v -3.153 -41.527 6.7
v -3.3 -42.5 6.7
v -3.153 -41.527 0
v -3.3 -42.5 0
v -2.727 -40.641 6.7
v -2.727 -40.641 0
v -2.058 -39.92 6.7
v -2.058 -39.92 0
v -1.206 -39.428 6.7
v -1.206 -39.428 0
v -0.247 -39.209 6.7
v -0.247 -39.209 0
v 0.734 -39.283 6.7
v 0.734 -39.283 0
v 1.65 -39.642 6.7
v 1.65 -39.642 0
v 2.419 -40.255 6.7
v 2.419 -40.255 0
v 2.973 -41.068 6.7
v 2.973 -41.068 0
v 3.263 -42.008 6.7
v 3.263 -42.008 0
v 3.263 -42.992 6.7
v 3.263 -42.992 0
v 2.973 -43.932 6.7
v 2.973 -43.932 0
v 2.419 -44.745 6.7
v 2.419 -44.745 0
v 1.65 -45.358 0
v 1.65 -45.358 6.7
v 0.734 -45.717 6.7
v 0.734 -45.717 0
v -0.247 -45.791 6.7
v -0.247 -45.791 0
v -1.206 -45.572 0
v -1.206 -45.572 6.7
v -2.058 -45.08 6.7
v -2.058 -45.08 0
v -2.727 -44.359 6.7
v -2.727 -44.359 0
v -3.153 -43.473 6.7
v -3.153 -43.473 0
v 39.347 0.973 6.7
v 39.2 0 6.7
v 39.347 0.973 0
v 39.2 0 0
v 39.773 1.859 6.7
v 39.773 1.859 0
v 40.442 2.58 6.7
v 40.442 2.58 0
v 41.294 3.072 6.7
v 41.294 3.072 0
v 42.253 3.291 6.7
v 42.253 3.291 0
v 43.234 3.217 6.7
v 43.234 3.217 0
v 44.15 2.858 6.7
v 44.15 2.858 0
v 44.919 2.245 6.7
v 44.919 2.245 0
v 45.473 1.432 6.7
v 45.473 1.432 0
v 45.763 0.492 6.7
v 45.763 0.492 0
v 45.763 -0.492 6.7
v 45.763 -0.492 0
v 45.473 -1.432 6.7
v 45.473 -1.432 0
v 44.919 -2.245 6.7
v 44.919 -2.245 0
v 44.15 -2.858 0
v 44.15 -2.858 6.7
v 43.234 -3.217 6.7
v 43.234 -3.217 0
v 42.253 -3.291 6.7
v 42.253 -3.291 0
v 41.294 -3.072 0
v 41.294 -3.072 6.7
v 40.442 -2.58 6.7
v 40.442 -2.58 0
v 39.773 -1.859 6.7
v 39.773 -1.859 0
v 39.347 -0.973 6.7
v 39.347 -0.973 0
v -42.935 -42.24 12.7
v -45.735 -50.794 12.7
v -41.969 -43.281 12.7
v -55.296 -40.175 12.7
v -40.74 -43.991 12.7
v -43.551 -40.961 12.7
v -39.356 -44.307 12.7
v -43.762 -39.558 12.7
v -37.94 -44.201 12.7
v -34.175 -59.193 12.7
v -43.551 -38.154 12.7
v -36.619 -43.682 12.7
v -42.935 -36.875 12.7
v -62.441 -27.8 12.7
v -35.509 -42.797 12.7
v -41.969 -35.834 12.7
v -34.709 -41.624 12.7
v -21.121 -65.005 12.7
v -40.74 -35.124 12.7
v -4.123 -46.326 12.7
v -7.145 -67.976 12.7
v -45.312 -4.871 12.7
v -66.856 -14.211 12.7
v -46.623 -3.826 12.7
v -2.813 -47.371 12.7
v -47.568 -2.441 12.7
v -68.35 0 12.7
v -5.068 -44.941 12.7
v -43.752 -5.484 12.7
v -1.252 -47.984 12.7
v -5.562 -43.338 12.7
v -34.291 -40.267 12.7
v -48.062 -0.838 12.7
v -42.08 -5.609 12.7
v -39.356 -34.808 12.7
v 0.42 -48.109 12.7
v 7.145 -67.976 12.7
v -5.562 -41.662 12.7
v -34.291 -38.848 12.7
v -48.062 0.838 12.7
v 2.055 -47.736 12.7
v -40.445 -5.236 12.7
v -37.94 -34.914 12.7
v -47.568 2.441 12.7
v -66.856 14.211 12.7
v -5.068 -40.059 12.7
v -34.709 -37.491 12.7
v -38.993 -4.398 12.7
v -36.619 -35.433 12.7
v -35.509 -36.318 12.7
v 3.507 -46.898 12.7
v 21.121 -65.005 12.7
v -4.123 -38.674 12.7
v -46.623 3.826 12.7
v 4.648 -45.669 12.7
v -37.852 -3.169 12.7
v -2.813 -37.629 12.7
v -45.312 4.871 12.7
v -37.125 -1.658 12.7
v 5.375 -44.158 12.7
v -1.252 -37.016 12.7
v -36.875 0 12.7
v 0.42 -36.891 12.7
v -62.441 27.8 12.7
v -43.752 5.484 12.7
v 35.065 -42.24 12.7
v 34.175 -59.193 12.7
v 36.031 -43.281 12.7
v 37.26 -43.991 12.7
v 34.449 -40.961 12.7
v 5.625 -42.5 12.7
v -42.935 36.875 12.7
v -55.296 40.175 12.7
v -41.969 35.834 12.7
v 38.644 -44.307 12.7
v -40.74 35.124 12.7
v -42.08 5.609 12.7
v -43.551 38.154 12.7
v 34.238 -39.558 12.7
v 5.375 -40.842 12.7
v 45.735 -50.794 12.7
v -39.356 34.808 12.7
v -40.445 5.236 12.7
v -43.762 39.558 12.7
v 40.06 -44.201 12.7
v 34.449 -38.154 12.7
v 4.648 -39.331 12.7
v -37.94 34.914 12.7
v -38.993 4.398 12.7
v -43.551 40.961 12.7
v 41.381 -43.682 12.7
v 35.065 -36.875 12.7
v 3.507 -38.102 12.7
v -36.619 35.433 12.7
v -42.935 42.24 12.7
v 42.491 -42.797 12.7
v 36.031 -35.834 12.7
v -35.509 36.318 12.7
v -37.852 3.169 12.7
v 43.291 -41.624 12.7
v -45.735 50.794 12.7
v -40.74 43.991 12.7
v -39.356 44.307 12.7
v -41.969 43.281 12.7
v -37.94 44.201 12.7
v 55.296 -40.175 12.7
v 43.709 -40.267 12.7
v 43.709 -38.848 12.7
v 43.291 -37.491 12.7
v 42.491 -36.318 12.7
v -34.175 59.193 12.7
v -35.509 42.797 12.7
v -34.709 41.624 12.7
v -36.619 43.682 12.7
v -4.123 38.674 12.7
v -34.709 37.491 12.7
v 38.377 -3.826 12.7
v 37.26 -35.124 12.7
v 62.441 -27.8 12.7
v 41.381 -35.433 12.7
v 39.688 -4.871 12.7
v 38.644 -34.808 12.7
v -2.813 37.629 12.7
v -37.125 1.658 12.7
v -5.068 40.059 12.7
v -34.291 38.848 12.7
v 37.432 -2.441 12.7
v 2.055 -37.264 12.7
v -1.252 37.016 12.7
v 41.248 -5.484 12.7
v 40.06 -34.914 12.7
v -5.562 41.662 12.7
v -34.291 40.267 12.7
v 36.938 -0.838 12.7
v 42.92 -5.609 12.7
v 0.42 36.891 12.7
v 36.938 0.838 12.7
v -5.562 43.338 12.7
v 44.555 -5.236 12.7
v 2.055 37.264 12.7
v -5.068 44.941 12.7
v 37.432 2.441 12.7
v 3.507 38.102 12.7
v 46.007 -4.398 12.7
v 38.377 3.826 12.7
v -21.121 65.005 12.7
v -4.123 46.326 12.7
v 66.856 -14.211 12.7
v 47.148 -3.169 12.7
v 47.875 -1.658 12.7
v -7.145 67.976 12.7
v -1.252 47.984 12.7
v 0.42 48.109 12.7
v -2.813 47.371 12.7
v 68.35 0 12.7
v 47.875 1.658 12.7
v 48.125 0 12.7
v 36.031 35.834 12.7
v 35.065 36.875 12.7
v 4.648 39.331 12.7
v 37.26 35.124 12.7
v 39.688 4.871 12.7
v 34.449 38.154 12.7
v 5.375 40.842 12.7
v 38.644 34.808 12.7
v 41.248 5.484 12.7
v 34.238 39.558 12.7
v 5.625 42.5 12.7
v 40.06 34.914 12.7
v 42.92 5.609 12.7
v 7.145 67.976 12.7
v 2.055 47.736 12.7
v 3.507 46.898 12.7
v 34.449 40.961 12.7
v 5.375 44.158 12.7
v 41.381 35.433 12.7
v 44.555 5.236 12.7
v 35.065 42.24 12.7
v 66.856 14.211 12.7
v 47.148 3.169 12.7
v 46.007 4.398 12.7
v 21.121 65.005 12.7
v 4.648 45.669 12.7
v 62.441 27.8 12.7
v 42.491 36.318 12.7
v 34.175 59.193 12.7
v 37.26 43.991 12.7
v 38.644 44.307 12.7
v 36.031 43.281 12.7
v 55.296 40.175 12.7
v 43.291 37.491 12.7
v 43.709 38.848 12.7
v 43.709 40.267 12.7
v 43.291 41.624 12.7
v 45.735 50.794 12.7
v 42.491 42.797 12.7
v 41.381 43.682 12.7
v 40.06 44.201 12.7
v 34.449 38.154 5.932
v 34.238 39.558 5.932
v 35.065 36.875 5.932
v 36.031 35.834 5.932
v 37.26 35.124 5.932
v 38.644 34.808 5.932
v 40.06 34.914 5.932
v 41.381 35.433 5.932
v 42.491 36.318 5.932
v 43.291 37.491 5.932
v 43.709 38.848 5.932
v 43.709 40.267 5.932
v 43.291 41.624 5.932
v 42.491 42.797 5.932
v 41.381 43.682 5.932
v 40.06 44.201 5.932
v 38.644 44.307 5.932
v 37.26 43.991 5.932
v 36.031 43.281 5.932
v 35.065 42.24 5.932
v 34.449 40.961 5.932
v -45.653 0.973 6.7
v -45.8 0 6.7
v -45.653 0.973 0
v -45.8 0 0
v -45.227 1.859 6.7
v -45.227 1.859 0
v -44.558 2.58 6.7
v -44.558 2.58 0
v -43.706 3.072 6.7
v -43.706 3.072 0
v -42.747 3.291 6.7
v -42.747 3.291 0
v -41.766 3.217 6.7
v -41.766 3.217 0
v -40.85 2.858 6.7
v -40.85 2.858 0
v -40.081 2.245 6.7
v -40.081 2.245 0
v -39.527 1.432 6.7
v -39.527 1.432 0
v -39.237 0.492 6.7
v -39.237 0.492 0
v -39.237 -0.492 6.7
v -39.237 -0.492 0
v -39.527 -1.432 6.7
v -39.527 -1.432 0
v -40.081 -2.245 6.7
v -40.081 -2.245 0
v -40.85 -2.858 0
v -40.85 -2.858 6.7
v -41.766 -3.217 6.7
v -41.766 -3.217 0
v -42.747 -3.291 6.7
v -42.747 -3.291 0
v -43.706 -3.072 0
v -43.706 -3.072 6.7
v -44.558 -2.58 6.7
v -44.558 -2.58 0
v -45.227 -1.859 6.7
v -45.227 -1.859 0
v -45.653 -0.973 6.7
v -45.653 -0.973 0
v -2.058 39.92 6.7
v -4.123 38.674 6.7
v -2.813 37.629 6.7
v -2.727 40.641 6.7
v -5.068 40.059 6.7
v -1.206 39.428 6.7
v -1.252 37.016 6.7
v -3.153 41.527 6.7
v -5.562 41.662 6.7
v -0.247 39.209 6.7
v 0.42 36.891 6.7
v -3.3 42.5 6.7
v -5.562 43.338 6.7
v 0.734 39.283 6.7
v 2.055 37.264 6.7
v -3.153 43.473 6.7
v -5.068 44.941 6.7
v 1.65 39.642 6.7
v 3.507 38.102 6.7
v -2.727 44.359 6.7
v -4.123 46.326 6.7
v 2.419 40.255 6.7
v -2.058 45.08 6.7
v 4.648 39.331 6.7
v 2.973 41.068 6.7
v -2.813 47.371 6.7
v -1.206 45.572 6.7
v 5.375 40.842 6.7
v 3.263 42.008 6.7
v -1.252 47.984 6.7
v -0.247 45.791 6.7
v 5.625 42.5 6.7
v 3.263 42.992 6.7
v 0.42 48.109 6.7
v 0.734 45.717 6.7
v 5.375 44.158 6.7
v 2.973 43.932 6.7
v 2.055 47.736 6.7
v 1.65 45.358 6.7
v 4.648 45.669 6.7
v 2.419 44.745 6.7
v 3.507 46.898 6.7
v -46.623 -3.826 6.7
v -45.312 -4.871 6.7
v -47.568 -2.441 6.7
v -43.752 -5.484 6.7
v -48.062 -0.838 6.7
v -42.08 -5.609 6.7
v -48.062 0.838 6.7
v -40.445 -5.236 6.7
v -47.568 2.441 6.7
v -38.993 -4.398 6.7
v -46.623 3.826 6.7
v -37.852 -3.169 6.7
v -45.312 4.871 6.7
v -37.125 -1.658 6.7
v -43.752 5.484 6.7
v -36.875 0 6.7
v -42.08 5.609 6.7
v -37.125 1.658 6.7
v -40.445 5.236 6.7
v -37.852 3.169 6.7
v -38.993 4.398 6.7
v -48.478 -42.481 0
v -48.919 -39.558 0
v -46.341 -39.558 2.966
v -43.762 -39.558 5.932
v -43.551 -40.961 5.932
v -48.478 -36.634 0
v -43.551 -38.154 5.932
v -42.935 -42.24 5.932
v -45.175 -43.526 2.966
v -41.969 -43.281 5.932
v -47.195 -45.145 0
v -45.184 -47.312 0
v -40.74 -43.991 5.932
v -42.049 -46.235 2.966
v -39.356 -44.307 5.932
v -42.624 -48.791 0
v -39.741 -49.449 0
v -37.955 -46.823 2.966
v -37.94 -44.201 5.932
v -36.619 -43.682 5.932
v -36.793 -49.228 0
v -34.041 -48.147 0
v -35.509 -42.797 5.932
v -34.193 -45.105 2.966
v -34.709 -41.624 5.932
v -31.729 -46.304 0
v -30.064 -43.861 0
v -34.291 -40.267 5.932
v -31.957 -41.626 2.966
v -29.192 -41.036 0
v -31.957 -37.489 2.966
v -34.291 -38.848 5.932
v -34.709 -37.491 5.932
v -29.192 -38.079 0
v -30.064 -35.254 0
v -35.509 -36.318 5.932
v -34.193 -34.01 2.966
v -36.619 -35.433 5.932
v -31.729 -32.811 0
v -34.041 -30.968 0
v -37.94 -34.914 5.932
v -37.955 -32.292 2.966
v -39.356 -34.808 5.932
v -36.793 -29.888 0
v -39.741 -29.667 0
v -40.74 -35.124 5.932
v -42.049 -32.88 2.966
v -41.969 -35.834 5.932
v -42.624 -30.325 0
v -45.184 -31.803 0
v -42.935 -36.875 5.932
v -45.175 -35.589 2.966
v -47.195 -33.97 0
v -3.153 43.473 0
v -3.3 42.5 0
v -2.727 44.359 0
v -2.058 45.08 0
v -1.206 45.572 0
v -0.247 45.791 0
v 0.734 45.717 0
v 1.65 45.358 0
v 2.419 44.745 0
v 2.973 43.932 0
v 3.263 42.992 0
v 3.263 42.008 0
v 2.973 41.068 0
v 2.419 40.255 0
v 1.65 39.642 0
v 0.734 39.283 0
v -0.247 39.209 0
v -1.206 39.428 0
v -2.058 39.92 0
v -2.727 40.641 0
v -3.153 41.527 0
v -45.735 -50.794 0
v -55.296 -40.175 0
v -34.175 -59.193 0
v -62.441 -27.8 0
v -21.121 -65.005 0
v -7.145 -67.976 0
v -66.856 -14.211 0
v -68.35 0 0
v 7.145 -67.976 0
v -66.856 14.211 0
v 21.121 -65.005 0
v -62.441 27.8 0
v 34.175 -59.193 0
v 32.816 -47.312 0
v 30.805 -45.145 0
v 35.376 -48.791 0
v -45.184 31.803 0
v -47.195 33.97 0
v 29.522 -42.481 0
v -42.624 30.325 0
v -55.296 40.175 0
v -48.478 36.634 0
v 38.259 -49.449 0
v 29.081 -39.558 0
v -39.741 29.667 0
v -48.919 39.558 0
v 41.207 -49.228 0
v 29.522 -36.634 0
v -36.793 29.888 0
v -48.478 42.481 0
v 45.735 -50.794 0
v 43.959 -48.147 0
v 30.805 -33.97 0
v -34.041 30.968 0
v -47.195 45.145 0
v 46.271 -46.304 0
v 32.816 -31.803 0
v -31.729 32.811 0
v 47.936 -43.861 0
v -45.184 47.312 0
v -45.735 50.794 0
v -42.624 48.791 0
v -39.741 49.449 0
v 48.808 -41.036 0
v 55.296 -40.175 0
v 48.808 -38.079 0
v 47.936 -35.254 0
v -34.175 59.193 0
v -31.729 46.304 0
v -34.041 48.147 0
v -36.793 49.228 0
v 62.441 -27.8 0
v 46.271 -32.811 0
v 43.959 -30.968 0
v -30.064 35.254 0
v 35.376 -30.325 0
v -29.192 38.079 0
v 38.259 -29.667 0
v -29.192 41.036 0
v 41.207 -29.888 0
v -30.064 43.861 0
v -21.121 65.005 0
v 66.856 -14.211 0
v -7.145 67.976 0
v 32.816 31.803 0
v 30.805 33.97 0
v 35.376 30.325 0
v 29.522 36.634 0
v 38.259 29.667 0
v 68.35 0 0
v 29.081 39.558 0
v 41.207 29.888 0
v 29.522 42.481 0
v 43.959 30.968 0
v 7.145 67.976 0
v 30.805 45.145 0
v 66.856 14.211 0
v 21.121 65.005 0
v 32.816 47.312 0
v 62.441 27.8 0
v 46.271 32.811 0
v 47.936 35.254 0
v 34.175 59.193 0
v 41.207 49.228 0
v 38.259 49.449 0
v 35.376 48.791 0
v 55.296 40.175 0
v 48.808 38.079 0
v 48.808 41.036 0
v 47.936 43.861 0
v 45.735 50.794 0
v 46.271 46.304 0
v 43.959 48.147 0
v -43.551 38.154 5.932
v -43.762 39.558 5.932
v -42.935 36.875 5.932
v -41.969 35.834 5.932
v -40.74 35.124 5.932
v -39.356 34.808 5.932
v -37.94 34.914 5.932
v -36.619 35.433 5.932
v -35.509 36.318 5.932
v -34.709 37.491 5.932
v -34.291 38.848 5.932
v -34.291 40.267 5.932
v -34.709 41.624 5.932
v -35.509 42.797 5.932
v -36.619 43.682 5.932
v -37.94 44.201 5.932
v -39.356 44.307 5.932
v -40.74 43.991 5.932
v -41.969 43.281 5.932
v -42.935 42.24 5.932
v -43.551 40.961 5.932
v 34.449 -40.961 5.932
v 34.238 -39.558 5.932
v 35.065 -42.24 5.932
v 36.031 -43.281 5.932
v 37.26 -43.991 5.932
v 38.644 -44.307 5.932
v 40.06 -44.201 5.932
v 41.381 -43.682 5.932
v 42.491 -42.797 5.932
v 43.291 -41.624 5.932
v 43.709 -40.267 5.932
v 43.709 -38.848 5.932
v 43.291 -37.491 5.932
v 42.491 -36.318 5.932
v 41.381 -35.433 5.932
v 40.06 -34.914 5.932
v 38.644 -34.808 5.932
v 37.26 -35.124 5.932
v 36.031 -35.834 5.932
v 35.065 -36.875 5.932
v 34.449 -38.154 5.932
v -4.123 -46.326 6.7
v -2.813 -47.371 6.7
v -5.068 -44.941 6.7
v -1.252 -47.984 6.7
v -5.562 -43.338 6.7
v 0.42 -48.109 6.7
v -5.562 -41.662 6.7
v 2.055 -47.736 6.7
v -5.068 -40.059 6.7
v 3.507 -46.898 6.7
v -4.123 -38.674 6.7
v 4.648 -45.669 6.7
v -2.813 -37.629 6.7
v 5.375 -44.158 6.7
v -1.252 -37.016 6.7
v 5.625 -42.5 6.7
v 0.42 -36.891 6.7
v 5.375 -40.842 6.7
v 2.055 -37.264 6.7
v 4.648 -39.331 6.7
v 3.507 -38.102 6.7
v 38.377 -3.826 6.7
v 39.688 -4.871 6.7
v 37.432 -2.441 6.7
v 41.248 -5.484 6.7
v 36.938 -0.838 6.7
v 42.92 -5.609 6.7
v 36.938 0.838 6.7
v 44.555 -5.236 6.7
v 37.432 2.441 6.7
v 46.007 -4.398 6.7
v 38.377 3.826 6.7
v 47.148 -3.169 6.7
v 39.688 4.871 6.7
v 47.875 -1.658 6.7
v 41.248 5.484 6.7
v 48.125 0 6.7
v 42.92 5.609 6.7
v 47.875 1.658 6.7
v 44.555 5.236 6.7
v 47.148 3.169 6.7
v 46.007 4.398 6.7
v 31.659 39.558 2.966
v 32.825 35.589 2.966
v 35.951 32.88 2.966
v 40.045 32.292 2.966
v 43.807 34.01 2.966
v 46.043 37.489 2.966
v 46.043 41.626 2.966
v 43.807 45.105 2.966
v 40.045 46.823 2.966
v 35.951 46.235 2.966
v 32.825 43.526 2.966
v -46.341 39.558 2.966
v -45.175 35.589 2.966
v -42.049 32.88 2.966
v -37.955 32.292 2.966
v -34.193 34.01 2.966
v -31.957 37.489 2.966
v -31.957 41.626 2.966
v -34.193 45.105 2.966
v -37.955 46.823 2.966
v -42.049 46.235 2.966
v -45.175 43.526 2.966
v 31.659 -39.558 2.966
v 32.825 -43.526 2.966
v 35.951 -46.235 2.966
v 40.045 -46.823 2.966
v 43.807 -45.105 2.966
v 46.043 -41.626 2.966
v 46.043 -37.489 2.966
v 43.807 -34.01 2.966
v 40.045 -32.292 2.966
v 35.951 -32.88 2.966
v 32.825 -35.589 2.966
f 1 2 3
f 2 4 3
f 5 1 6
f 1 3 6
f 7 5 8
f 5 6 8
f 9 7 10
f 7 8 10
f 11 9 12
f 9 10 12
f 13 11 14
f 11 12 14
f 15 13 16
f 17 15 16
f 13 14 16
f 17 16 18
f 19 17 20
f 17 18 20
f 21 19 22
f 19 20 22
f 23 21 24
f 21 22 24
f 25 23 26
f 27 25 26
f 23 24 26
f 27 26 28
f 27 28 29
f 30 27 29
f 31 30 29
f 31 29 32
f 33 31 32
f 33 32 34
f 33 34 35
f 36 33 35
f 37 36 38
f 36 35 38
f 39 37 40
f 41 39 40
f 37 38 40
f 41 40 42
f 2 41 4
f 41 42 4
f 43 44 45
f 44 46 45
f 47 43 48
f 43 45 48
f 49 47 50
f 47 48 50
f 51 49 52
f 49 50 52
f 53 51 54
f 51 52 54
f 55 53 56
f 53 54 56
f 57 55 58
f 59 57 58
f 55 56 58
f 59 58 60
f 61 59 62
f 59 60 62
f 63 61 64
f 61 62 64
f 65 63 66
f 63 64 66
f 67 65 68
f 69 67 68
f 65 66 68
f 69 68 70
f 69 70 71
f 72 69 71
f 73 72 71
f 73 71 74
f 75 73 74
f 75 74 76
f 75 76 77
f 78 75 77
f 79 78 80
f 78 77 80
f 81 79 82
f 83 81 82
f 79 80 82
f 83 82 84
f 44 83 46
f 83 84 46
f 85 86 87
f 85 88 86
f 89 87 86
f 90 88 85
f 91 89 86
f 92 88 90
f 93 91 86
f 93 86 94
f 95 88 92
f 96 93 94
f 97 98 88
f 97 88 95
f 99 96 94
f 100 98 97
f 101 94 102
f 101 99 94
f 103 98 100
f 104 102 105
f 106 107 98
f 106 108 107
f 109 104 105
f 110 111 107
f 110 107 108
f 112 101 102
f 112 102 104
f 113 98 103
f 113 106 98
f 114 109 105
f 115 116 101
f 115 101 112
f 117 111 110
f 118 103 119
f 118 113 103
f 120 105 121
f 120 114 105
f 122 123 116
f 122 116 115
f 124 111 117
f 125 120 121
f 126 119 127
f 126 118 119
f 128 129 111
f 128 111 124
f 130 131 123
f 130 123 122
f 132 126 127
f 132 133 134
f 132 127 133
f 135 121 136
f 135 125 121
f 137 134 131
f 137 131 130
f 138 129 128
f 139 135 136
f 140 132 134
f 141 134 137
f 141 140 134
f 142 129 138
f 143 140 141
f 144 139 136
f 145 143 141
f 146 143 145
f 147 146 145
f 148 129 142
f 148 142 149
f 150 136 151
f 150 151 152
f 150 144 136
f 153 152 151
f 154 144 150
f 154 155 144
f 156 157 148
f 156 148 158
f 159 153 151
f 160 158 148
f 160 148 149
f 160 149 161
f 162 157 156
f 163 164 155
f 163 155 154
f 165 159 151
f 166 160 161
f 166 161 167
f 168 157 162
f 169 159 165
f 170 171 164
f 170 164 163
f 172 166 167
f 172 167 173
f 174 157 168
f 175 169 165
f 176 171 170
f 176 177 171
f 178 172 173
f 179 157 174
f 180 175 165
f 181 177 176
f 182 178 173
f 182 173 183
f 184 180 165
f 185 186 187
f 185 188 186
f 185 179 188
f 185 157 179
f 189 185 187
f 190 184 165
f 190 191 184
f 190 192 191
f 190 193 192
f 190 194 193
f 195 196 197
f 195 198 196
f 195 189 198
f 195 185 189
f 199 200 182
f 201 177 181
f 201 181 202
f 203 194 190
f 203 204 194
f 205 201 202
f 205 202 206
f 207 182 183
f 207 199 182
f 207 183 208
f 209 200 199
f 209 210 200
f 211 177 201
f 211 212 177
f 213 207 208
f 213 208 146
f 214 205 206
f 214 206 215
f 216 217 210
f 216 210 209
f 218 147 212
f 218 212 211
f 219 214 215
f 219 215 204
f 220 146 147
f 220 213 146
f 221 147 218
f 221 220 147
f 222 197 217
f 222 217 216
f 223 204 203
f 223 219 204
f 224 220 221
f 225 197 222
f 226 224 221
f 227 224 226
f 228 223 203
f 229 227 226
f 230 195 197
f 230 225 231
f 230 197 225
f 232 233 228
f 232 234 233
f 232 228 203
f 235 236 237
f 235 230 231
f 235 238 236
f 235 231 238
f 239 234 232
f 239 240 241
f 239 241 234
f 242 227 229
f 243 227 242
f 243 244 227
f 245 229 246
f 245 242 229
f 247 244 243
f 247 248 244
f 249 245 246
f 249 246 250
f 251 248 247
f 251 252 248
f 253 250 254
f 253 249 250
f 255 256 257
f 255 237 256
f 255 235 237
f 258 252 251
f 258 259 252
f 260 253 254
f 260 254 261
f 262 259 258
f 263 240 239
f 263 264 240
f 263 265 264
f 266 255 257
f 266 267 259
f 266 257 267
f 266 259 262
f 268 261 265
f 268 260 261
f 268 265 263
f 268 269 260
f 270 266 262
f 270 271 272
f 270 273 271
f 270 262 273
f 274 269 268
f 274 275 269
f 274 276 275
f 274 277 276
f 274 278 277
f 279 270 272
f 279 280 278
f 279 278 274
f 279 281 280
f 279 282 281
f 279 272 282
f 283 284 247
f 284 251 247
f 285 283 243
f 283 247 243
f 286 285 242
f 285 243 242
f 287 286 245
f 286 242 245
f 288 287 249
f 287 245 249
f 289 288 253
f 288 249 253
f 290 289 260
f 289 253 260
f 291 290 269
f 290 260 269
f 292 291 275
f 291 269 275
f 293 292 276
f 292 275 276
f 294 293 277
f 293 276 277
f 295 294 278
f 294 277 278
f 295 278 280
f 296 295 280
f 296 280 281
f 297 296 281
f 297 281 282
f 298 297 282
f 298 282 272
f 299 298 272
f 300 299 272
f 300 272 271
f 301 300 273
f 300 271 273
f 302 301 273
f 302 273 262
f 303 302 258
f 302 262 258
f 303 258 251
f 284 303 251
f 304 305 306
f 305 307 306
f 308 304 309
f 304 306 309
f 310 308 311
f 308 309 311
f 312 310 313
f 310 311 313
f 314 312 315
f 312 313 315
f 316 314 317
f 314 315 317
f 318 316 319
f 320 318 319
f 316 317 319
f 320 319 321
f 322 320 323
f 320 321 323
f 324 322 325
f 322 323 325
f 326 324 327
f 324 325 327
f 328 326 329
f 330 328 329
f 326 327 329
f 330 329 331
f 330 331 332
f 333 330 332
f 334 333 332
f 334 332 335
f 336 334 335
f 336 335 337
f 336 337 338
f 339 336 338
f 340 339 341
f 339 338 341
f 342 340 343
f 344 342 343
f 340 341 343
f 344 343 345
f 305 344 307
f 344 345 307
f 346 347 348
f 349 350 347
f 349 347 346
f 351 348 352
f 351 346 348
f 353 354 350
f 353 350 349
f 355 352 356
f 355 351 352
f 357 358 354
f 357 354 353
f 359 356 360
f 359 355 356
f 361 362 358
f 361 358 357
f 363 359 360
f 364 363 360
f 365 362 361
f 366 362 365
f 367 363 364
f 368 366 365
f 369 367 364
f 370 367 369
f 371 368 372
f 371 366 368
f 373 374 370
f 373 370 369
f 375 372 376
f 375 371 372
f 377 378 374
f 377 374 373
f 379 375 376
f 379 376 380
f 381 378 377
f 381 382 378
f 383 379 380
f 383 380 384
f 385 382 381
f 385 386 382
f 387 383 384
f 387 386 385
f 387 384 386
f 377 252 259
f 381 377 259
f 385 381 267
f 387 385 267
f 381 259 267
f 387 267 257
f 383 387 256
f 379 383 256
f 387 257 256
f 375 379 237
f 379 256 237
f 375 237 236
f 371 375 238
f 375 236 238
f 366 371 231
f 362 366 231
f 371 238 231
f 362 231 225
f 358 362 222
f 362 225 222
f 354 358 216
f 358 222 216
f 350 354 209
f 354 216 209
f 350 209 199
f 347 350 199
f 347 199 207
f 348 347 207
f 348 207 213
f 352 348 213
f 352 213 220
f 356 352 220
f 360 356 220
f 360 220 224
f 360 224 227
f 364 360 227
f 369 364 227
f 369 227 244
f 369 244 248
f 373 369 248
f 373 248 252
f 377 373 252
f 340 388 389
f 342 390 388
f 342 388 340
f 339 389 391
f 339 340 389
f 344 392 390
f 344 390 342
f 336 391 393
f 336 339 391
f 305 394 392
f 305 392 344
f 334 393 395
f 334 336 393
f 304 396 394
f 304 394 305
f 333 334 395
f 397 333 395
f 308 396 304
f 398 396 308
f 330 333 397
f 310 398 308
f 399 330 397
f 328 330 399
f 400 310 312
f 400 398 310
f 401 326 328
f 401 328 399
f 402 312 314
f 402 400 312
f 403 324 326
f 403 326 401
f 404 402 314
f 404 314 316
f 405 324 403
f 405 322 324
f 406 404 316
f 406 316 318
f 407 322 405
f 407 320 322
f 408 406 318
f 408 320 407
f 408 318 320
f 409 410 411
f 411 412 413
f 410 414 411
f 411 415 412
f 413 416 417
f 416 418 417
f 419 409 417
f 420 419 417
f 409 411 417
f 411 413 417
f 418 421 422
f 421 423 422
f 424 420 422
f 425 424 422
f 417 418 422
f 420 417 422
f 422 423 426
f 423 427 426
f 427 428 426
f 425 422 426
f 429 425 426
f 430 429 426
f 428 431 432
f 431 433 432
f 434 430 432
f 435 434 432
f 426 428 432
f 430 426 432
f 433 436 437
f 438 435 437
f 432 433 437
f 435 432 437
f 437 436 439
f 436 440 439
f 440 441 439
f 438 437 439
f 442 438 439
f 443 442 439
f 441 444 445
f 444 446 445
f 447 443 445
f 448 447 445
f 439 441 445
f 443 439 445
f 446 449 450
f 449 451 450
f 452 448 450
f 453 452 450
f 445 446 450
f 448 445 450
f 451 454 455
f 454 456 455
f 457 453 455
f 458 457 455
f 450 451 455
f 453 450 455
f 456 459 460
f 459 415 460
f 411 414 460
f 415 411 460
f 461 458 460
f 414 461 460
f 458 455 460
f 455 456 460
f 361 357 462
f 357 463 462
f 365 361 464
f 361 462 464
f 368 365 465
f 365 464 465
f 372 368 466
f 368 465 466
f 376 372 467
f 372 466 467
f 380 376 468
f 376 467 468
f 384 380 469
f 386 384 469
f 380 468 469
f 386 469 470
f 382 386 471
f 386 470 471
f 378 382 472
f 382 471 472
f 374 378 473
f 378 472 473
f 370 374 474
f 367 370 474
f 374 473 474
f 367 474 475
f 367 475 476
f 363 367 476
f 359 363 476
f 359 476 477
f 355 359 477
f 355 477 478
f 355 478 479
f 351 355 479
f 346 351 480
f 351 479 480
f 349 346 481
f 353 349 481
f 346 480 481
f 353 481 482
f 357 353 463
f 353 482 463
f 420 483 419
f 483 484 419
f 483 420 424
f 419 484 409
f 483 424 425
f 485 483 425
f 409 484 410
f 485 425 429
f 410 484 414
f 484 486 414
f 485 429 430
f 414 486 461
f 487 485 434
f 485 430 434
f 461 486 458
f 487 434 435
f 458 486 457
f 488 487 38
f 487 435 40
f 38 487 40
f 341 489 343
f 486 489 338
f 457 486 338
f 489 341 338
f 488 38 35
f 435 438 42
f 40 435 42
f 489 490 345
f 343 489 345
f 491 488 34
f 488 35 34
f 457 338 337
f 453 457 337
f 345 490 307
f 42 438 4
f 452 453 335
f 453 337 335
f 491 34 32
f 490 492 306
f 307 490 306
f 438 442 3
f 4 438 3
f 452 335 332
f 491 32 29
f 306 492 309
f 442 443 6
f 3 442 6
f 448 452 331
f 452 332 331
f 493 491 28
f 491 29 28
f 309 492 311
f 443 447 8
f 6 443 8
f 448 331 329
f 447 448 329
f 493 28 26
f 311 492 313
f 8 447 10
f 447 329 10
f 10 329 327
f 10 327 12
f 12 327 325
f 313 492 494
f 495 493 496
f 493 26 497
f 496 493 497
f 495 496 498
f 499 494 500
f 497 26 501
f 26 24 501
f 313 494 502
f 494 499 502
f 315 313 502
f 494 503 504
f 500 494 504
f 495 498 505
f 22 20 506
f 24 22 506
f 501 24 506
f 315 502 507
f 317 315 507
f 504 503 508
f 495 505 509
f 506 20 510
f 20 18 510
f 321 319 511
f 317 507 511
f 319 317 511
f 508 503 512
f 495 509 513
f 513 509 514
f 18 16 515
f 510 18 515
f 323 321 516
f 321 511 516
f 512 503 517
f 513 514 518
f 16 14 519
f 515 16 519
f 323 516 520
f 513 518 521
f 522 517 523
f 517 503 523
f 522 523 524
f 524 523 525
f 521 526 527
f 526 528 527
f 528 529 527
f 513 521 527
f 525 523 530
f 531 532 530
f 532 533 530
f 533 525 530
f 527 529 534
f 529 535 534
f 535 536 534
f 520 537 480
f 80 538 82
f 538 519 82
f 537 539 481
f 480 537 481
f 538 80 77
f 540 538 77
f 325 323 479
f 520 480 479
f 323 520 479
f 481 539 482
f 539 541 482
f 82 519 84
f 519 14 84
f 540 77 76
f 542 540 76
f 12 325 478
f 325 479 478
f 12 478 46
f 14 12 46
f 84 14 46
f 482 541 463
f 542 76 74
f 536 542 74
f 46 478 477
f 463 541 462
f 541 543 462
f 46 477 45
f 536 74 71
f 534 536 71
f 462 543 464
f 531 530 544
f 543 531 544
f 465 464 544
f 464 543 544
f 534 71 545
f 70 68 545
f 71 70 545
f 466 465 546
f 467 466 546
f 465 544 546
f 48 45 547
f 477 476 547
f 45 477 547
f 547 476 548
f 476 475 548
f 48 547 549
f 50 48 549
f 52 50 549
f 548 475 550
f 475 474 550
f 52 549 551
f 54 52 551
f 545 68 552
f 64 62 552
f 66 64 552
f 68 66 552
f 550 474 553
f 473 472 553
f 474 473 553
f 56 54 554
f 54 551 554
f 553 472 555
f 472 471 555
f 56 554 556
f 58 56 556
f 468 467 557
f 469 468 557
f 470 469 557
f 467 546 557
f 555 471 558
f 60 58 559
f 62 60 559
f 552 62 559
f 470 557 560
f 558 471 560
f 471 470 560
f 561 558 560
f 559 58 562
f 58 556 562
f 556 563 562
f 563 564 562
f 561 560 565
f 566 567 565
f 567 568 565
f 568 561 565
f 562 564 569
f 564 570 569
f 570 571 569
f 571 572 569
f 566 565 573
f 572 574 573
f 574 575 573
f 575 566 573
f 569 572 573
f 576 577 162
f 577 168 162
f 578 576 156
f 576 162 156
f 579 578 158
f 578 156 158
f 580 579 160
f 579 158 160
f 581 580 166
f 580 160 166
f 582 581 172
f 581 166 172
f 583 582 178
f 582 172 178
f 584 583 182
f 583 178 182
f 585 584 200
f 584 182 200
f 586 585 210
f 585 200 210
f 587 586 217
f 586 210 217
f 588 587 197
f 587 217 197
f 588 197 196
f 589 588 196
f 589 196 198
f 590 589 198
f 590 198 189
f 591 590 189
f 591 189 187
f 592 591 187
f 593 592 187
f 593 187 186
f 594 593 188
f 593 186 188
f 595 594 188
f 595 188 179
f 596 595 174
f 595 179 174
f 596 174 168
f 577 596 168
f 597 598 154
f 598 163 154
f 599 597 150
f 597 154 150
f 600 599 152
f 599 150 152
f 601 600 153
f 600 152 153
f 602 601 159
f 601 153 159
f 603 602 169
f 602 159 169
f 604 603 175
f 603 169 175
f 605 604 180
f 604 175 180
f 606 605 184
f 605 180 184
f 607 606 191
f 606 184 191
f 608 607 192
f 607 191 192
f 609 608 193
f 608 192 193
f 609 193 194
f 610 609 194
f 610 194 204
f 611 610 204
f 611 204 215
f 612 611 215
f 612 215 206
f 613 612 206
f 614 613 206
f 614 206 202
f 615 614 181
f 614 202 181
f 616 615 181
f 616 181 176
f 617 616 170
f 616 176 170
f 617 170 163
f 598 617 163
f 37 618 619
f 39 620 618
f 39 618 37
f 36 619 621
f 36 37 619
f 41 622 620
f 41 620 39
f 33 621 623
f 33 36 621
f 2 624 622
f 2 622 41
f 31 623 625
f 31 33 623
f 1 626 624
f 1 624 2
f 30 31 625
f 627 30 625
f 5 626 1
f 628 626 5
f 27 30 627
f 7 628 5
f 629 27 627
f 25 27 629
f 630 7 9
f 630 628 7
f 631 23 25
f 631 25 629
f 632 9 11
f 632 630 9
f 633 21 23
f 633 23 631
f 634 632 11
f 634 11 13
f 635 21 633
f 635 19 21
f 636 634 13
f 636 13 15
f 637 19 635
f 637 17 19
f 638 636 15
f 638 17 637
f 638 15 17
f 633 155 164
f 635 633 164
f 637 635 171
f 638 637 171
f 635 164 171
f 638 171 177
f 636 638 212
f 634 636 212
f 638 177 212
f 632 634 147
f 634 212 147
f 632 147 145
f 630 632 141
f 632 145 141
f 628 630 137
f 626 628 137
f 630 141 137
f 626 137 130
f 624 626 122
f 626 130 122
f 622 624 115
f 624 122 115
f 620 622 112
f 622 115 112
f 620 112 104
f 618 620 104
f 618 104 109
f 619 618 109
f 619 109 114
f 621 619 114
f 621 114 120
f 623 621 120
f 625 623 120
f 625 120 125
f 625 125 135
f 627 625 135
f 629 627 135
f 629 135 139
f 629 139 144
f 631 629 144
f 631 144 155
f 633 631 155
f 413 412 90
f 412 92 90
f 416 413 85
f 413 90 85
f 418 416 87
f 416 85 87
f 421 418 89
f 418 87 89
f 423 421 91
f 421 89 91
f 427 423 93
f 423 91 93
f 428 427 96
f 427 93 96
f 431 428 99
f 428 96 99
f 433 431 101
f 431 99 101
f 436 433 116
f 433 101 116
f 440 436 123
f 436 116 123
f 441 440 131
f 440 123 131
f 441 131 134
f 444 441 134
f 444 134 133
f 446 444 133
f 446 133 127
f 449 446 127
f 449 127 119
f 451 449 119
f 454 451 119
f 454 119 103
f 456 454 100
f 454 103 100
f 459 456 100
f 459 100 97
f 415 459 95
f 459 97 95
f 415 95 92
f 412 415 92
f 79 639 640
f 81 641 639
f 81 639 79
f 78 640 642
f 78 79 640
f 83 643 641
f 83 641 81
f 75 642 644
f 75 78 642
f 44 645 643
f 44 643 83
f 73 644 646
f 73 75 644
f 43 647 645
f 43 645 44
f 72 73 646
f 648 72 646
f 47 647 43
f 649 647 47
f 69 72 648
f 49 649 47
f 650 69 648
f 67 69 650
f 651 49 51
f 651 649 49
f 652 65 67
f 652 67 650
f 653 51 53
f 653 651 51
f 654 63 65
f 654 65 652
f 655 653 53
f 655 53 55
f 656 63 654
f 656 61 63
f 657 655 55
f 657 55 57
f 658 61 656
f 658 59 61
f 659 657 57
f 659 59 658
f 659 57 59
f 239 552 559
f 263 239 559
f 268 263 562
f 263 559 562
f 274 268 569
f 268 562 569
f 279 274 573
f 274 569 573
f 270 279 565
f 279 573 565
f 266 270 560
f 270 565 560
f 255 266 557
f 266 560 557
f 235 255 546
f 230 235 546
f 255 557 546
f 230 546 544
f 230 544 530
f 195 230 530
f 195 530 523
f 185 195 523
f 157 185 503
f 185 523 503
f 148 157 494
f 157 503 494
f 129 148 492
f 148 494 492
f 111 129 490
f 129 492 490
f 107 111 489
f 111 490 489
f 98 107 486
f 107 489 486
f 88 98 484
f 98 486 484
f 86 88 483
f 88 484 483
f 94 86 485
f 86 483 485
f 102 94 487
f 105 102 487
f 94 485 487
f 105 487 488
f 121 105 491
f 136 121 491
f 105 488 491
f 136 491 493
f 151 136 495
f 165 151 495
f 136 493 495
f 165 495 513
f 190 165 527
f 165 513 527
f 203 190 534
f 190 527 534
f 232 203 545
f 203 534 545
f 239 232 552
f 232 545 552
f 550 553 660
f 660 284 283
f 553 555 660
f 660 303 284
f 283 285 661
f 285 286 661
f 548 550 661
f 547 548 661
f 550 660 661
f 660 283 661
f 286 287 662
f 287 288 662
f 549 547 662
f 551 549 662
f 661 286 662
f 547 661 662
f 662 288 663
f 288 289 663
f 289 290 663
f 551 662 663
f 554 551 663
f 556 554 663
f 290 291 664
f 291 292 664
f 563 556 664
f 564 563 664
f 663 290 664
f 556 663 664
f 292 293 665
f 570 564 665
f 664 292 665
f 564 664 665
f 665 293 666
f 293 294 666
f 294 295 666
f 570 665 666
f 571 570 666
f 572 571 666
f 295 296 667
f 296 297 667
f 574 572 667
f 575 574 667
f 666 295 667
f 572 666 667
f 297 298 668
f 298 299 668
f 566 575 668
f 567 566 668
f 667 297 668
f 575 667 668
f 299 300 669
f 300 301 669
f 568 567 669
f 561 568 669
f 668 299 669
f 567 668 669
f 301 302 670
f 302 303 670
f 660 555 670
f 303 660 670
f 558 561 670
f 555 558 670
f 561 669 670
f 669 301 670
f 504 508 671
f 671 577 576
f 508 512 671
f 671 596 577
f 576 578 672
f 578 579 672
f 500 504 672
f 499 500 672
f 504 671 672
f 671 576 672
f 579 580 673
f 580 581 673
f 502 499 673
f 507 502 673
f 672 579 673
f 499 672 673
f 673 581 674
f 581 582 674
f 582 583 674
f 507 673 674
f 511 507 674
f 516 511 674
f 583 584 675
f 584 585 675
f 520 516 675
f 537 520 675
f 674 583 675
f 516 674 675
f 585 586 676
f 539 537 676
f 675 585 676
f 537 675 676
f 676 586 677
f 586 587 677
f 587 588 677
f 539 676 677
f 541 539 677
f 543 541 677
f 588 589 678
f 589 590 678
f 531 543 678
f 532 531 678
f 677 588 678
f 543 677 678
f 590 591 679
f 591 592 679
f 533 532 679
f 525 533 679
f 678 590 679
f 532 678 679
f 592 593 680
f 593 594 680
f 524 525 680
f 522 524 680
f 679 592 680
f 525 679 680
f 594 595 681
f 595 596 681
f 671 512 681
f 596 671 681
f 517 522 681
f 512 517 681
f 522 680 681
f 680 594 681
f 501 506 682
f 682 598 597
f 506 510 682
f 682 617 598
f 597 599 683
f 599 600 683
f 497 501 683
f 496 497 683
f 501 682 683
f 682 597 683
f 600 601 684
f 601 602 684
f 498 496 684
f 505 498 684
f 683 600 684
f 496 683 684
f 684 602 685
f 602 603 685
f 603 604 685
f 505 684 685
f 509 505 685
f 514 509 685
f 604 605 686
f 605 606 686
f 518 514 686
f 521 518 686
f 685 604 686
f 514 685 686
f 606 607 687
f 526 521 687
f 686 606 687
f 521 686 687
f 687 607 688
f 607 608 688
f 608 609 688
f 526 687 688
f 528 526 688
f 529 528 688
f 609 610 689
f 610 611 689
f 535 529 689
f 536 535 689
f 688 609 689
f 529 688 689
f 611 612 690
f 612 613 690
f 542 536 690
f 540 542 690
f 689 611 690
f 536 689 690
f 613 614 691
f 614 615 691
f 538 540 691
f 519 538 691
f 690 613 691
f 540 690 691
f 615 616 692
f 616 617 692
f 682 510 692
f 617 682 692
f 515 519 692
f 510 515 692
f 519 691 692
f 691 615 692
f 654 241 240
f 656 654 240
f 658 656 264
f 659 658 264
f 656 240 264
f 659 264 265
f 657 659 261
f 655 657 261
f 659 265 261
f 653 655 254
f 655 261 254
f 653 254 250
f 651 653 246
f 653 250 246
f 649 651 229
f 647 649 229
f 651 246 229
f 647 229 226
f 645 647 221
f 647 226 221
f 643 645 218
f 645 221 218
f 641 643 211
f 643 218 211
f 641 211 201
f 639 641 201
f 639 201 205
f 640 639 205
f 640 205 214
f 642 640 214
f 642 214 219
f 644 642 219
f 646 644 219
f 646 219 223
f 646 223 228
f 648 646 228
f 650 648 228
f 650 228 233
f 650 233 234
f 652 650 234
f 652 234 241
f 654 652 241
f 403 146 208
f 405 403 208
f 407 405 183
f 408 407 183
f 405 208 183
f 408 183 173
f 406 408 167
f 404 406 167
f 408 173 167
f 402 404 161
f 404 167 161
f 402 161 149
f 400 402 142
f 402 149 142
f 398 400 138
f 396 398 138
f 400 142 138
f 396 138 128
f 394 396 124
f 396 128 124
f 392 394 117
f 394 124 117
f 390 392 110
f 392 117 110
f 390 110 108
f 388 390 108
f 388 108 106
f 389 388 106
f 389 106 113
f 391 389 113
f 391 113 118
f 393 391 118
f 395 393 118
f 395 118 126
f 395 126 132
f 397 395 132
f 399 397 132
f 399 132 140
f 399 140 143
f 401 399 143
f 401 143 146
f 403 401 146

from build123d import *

# Parameters (mm, degrees)
F1_R           = 68.35
F2_DEPTH       = 12.7
F4_D           = 9.525
F4_CSINK_D     = 19.8374
F4_CSINK_ANGLE = 82
F6_D           = 6.6
F6_CBORE_D     = 11.25
F6_CBORE_DEPTH = 6


# Not quite as in the source:
# - a length typed as a fraction of an inch, garbled in the dataset ("3 / 203.2 mm" for 3/8 in), is restored
# - a feature names something its author has since deleted; it is built from what else it names


with BuildPart() as f2:
    # F1 (on Top) → F2 (new body)
    with BuildSketch(Plane.XY):
        Circle(F1_R)
    extrude(amount=F2_DEPTH)

    # F4 (through all)
    with Locations(Plane(origin=(0, 0, 0), x_dir=(1, 0, 0), z_dir=(0, 0, -1))):
        with Locations((-39, -39.5575846078), (39, -39.5575846078), (-39, 39.5575846078), (39, 39.5575846078)):
            CounterSinkHole(F4_D / 2, F4_CSINK_D / 2, counter_sink_angle=F4_CSINK_ANGLE)

    # F6 (through all)
    with Locations(Plane.XY.offset(12.7)):
        with Locations((0, 42.5), (42.5, 0), (0, -42.5), (-42.5, 0)):
            CounterBoreHole(F6_D / 2, F6_CBORE_D / 2, F6_CBORE_DEPTH)


solid = f2.part
